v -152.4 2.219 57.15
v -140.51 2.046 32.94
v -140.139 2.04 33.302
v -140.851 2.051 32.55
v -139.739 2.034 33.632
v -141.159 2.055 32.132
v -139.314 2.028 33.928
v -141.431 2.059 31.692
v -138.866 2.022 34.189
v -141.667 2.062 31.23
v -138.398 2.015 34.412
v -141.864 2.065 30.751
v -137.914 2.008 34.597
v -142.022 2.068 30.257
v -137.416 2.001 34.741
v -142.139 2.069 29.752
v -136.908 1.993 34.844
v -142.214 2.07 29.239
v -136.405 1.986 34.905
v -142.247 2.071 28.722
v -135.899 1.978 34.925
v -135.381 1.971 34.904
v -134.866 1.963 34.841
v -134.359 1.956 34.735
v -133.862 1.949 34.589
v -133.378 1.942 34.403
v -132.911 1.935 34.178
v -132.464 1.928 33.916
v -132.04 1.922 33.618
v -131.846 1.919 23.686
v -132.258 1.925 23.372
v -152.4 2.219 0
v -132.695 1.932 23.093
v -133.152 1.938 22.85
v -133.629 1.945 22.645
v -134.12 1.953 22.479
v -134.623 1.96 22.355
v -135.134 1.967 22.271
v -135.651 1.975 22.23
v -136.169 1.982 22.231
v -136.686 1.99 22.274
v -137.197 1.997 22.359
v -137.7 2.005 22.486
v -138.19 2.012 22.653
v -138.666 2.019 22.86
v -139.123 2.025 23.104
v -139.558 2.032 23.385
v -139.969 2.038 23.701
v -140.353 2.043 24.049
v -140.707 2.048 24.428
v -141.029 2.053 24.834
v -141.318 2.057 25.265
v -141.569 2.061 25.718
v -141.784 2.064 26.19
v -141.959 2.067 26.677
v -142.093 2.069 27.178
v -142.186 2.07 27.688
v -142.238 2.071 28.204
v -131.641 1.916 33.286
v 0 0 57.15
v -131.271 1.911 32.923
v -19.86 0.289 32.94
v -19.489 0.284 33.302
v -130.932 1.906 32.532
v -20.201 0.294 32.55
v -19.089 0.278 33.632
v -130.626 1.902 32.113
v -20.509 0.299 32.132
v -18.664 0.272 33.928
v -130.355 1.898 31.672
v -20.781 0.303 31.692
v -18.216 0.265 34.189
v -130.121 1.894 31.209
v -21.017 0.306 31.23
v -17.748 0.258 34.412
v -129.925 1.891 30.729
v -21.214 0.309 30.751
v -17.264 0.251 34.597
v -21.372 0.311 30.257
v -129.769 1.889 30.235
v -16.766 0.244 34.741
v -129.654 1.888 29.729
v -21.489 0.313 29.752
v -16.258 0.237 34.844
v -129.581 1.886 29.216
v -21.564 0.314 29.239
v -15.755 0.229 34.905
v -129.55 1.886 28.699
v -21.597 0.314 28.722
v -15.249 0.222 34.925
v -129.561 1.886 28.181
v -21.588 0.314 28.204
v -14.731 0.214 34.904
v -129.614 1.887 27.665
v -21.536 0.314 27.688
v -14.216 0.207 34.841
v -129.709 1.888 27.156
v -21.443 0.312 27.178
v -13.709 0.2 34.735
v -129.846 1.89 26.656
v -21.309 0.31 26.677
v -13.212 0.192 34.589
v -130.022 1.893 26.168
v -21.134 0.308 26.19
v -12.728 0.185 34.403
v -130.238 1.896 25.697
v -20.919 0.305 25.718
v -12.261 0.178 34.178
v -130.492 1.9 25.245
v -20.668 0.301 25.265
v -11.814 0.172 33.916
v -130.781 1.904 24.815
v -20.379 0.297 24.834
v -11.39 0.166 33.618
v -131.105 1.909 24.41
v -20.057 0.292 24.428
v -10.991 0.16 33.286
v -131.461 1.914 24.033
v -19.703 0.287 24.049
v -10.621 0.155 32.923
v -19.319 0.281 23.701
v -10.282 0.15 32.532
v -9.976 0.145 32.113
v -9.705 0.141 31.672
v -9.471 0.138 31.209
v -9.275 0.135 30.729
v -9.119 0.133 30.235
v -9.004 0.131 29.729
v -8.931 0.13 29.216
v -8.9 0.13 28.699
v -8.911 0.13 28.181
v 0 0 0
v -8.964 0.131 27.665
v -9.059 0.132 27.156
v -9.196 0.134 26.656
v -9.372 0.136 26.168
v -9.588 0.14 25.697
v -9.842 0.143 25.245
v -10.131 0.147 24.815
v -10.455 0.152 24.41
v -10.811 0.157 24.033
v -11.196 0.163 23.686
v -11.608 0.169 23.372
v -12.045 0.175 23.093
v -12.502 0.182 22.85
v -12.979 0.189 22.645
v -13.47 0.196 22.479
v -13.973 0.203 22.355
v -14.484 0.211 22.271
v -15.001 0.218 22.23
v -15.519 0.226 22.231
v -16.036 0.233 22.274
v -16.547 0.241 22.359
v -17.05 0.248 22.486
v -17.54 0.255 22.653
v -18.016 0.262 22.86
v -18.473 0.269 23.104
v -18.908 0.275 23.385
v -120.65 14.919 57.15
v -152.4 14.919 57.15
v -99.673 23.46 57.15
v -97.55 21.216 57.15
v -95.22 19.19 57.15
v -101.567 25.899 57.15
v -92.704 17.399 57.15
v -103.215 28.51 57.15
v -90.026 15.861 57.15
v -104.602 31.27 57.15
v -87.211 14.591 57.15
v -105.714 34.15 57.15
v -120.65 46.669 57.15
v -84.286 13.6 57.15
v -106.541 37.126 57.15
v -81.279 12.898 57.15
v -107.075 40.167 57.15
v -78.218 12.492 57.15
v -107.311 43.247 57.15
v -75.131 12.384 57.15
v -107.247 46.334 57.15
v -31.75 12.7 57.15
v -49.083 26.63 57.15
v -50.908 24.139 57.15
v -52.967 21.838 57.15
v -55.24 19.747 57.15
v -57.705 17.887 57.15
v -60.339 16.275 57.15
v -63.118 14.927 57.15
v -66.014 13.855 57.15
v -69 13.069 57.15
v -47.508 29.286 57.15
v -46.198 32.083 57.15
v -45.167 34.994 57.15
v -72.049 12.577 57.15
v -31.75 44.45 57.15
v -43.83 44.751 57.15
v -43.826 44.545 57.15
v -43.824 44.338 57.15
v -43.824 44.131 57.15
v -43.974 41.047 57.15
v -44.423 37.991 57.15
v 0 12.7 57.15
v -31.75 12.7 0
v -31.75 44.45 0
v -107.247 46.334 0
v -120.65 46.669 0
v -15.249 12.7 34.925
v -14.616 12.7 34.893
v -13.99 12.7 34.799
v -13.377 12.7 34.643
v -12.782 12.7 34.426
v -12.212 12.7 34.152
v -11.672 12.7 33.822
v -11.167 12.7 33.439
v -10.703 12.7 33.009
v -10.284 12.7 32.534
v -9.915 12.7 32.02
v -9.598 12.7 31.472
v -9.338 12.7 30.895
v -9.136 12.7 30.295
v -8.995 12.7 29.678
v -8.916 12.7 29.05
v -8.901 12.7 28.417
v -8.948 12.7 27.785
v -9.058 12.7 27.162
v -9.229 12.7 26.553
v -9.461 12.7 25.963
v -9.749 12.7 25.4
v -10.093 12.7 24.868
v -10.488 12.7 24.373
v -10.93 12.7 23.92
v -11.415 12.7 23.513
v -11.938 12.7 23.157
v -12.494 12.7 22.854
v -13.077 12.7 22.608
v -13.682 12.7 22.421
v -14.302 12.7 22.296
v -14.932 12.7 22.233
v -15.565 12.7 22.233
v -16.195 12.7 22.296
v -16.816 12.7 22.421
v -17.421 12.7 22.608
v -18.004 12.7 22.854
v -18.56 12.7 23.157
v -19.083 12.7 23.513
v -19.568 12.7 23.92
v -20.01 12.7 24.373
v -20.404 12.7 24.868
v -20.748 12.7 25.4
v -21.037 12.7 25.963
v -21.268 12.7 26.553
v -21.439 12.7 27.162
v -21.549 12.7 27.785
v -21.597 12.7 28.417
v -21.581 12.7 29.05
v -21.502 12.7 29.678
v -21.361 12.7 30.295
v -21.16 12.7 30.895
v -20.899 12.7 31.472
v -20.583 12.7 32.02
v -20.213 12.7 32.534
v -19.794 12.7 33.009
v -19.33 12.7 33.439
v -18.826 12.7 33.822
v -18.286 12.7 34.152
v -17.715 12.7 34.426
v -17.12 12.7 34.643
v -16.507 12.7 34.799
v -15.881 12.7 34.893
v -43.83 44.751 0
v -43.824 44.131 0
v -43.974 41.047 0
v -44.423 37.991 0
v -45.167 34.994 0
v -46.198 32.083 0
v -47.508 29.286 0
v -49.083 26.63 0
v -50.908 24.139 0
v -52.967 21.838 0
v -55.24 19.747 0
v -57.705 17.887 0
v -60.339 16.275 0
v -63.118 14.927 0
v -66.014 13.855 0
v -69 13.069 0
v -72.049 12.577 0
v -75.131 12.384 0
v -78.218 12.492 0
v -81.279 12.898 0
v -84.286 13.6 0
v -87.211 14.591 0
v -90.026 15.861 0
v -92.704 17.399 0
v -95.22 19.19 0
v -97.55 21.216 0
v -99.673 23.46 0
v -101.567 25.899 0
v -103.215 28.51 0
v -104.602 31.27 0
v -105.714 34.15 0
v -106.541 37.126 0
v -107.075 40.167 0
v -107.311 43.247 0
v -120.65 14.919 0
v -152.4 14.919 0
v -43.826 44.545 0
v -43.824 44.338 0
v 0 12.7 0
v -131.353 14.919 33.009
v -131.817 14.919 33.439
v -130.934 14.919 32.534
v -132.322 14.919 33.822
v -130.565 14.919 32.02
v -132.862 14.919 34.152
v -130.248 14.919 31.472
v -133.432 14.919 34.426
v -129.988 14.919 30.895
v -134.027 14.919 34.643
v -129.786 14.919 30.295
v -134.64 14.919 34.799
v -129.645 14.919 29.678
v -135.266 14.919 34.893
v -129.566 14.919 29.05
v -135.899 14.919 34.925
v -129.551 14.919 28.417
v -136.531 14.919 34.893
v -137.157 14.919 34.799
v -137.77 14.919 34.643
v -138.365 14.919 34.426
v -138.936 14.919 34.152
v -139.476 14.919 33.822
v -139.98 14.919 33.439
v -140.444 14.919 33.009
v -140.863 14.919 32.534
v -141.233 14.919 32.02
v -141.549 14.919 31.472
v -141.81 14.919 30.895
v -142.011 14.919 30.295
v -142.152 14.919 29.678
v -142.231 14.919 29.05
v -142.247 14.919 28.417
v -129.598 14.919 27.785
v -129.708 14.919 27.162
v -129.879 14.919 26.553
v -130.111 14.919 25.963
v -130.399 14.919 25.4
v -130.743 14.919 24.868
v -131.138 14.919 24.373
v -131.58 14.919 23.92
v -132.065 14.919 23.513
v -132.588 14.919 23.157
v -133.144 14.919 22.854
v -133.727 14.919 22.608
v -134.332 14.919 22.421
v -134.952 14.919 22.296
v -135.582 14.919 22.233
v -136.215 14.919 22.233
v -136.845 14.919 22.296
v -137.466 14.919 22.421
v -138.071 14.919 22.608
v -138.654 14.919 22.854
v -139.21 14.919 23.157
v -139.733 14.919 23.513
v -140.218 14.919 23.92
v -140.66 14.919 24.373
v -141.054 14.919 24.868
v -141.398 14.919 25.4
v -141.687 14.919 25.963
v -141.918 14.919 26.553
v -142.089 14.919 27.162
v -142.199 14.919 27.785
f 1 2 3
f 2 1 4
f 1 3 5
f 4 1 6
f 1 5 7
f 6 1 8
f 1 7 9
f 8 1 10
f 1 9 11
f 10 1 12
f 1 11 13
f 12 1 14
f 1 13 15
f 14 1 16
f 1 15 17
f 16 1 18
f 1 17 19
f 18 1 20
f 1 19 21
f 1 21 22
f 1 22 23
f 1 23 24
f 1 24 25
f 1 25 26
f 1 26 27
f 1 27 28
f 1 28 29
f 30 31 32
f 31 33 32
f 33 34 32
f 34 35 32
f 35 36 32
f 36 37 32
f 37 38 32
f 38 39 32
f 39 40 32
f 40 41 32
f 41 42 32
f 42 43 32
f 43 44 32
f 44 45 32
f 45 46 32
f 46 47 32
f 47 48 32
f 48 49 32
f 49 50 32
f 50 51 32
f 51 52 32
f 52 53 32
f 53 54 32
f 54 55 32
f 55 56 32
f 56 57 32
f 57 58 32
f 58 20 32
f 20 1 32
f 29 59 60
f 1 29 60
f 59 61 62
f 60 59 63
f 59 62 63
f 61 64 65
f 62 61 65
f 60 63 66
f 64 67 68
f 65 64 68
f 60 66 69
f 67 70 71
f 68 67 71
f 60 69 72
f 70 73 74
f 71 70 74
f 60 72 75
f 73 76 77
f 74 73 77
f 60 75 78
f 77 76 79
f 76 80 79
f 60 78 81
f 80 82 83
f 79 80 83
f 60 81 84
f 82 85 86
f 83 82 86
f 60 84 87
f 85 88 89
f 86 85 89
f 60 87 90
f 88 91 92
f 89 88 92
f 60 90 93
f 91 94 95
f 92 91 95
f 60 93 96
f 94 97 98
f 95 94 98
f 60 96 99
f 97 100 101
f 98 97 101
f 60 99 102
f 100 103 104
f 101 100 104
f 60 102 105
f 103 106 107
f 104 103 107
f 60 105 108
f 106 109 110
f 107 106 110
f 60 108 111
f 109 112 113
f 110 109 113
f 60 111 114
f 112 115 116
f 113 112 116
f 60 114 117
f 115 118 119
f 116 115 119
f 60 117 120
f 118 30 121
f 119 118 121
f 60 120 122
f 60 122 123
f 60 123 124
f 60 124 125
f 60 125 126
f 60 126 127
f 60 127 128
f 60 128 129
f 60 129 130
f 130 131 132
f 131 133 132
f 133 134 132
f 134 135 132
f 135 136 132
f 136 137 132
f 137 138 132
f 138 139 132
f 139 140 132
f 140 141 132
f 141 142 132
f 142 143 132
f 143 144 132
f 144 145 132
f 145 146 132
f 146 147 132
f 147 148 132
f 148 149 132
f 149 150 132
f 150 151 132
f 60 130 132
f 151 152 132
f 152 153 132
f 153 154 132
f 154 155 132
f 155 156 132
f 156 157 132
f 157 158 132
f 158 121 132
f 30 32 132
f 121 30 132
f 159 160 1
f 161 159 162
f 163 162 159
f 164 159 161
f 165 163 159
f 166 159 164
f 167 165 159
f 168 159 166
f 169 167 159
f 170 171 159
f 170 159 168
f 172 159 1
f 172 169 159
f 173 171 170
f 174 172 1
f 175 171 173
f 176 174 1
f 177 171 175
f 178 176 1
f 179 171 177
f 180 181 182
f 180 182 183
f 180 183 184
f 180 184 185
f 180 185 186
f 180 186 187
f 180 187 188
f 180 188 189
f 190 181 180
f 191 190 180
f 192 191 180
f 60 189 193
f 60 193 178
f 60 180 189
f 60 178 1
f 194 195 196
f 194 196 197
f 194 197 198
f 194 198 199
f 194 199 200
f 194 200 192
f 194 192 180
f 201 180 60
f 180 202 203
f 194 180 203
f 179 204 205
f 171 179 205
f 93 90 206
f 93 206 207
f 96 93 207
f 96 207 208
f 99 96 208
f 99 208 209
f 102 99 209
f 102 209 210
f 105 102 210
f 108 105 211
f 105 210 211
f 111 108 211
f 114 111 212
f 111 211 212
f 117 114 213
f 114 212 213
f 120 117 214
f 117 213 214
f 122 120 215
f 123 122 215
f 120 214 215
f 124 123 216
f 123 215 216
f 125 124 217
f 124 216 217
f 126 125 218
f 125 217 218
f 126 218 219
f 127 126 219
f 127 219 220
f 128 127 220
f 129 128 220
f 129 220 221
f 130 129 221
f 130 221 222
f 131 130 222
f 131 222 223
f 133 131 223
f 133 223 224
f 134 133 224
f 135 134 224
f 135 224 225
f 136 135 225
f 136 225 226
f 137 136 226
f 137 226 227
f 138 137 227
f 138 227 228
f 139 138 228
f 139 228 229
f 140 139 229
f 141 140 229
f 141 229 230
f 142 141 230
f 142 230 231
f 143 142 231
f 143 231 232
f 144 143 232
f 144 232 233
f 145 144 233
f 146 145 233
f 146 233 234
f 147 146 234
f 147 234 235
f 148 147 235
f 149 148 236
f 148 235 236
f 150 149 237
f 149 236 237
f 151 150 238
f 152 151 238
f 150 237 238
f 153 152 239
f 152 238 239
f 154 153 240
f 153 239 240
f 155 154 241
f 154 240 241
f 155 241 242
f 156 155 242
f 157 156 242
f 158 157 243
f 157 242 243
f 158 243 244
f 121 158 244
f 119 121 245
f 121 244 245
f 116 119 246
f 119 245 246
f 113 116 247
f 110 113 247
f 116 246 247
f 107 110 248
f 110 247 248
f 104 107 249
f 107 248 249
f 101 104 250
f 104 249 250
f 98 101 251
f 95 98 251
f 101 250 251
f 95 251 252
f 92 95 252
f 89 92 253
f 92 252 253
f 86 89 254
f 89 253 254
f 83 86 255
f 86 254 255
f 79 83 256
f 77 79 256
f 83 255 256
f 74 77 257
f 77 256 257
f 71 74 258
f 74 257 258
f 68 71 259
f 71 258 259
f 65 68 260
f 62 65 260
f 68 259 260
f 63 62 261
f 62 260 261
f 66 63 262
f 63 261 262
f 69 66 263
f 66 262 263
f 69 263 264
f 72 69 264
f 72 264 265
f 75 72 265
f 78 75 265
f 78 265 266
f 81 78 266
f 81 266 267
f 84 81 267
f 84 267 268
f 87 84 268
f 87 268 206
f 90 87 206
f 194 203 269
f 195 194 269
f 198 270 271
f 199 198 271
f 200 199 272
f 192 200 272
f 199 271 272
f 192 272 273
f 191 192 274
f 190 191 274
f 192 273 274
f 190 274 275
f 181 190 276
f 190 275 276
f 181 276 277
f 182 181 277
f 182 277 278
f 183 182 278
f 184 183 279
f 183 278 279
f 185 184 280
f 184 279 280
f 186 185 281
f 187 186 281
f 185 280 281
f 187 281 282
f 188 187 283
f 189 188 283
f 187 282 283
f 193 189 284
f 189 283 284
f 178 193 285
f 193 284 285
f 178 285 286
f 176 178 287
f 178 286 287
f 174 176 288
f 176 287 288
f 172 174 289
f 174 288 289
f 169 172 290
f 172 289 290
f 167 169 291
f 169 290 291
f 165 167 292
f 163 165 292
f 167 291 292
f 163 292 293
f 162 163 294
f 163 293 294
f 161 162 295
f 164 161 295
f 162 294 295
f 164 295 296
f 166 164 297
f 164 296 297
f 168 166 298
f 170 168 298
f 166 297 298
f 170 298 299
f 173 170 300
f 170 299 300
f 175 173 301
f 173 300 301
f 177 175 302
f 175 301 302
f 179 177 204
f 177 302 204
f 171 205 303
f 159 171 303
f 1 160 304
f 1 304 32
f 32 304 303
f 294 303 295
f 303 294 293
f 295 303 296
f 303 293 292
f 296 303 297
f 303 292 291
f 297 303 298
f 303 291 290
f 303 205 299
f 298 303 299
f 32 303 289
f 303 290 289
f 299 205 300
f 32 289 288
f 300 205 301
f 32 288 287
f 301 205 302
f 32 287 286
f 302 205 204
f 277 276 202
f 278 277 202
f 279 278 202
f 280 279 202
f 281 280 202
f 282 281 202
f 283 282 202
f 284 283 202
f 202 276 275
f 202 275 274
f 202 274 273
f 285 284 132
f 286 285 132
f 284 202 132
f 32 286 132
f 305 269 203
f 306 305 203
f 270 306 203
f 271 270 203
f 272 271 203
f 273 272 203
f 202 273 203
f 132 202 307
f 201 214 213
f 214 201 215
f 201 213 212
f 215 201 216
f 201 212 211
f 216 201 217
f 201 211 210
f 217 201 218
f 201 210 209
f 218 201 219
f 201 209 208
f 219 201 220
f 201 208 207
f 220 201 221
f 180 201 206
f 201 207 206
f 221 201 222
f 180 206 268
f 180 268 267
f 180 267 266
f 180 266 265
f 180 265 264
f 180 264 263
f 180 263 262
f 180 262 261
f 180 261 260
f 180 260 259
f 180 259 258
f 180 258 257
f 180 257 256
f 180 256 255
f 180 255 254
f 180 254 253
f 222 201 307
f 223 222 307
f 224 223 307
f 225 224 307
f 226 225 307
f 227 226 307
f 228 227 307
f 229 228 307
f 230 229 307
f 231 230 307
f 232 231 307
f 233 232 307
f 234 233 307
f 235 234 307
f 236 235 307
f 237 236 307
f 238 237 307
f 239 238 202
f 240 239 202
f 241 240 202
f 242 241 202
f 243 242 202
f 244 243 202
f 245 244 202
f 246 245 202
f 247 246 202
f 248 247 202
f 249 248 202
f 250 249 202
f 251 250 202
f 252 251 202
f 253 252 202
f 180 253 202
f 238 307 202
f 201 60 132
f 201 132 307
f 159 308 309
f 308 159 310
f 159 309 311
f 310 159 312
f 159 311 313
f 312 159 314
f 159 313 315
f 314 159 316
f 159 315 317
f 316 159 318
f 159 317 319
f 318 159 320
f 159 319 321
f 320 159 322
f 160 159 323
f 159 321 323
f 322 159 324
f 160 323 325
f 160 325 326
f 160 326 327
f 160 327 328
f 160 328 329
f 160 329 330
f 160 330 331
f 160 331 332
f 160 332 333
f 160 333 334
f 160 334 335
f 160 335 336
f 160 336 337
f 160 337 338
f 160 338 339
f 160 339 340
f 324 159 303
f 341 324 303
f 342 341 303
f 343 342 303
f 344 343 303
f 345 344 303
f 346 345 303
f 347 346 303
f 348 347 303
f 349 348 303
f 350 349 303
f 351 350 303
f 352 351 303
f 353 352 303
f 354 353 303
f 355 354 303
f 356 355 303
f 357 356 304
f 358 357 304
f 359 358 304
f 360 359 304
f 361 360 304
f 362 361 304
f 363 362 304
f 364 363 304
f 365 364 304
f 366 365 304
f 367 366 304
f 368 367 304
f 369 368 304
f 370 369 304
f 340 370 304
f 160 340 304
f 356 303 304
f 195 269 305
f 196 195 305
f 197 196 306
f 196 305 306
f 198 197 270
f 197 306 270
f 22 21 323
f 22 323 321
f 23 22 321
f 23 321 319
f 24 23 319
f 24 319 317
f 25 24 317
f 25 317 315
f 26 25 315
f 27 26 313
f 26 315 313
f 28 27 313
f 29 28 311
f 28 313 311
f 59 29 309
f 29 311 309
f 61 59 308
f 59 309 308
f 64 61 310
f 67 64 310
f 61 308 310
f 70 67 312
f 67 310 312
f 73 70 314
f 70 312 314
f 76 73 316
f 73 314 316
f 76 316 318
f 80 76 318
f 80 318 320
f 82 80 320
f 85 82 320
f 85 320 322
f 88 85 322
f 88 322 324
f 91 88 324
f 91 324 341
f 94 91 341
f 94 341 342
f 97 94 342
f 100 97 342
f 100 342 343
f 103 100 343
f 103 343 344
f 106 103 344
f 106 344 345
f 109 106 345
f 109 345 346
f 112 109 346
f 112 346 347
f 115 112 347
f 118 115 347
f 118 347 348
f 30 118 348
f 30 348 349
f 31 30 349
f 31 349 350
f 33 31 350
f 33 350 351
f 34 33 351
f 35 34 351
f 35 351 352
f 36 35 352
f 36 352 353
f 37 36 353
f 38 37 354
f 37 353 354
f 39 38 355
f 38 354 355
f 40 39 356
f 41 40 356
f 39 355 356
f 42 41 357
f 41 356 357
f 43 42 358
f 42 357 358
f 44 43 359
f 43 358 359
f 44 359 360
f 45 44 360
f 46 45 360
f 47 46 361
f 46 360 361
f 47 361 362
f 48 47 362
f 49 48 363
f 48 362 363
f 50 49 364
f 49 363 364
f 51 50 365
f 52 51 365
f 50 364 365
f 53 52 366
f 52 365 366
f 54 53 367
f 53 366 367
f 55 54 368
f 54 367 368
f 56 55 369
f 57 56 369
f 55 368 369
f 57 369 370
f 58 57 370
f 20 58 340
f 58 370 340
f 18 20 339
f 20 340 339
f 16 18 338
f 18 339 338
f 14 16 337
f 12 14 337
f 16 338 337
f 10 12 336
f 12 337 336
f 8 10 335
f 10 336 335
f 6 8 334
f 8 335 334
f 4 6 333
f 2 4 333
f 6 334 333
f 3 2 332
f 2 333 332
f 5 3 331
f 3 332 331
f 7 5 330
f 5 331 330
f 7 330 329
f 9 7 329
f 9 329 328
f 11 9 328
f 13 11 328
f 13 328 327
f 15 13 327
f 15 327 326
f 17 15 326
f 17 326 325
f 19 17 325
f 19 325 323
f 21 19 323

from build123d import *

# Parameters (mm, degrees)
BOSS_EXTRUDE2_DEPTH = 57.15
SKETCH8_R           = 6.35
CUT_EXTRUDE8_DEPTH  = 91.948
SKETCH6_R           = 6.35
CUT_EXTRUDE9_DEPTH  = 91.948


with BuildPart() as part:
    # Sketch1 → Boss-Extrude2 (new body)
    with BuildSketch(Plane.XY):
        with BuildLine():
            Line((-152.4, 2.2186447), (0, 0))
            Line((0, 0), (0, 12.7))
            Line((0, 12.7), (-31.75, 12.7))
            Line((-31.75, 12.7), (-31.75, 44.45))
            Line((-31.75, 44.45), (-43.829743935, 44.75146974))
            ThreePointArc((-43.829743935, 44.75146974), (-43.825200034, 44.441370306), (-43.823685352, 44.131241281))
            ThreePointArc((-43.823685352, 44.131241281), (-76.675806516, 12.400375725), (-107.247170639, 46.334155203))
            Line((-107.247170639, 46.334155203), (-120.65, 46.6686447))
            Line((-120.65, 46.6686447), (-120.65, 14.9186447))
            Line((-120.65, 14.9186447), (-152.4, 14.9186447))
            Line((-152.4, 14.9186447), (-152.4, 2.2186447))
        make_face()
    extrude(amount=BOSS_EXTRUDE2_DEPTH)

    # Sketch8 → Cut-Extrude8 (cut)
    with BuildSketch(Plane(origin=(0, 14.9186447, 0), x_dir=(1, 0, 0), z_dir=(0, 1, 0))):
        with Locations(Location((-135.898685352, -28.575, 0), (0, 0, 270))):
            Circle(SKETCH8_R)
    extrude(amount=-CUT_EXTRUDE8_DEPTH, mode=Mode.SUBTRACT)

    # Sketch6 → Cut-Extrude9 (cut)
    with BuildSketch(Plane(origin=(0, 12.7, 0), x_dir=(1, 0, 0), z_dir=(0, 1, 0))):
        with Locations(Location((-15.248685352, -28.575, 0), (0, 0, 270))):
            Circle(SKETCH6_R)
    extrude(amount=-CUT_EXTRUDE9_DEPTH, mode=Mode.SUBTRACT)


solid = part.part
